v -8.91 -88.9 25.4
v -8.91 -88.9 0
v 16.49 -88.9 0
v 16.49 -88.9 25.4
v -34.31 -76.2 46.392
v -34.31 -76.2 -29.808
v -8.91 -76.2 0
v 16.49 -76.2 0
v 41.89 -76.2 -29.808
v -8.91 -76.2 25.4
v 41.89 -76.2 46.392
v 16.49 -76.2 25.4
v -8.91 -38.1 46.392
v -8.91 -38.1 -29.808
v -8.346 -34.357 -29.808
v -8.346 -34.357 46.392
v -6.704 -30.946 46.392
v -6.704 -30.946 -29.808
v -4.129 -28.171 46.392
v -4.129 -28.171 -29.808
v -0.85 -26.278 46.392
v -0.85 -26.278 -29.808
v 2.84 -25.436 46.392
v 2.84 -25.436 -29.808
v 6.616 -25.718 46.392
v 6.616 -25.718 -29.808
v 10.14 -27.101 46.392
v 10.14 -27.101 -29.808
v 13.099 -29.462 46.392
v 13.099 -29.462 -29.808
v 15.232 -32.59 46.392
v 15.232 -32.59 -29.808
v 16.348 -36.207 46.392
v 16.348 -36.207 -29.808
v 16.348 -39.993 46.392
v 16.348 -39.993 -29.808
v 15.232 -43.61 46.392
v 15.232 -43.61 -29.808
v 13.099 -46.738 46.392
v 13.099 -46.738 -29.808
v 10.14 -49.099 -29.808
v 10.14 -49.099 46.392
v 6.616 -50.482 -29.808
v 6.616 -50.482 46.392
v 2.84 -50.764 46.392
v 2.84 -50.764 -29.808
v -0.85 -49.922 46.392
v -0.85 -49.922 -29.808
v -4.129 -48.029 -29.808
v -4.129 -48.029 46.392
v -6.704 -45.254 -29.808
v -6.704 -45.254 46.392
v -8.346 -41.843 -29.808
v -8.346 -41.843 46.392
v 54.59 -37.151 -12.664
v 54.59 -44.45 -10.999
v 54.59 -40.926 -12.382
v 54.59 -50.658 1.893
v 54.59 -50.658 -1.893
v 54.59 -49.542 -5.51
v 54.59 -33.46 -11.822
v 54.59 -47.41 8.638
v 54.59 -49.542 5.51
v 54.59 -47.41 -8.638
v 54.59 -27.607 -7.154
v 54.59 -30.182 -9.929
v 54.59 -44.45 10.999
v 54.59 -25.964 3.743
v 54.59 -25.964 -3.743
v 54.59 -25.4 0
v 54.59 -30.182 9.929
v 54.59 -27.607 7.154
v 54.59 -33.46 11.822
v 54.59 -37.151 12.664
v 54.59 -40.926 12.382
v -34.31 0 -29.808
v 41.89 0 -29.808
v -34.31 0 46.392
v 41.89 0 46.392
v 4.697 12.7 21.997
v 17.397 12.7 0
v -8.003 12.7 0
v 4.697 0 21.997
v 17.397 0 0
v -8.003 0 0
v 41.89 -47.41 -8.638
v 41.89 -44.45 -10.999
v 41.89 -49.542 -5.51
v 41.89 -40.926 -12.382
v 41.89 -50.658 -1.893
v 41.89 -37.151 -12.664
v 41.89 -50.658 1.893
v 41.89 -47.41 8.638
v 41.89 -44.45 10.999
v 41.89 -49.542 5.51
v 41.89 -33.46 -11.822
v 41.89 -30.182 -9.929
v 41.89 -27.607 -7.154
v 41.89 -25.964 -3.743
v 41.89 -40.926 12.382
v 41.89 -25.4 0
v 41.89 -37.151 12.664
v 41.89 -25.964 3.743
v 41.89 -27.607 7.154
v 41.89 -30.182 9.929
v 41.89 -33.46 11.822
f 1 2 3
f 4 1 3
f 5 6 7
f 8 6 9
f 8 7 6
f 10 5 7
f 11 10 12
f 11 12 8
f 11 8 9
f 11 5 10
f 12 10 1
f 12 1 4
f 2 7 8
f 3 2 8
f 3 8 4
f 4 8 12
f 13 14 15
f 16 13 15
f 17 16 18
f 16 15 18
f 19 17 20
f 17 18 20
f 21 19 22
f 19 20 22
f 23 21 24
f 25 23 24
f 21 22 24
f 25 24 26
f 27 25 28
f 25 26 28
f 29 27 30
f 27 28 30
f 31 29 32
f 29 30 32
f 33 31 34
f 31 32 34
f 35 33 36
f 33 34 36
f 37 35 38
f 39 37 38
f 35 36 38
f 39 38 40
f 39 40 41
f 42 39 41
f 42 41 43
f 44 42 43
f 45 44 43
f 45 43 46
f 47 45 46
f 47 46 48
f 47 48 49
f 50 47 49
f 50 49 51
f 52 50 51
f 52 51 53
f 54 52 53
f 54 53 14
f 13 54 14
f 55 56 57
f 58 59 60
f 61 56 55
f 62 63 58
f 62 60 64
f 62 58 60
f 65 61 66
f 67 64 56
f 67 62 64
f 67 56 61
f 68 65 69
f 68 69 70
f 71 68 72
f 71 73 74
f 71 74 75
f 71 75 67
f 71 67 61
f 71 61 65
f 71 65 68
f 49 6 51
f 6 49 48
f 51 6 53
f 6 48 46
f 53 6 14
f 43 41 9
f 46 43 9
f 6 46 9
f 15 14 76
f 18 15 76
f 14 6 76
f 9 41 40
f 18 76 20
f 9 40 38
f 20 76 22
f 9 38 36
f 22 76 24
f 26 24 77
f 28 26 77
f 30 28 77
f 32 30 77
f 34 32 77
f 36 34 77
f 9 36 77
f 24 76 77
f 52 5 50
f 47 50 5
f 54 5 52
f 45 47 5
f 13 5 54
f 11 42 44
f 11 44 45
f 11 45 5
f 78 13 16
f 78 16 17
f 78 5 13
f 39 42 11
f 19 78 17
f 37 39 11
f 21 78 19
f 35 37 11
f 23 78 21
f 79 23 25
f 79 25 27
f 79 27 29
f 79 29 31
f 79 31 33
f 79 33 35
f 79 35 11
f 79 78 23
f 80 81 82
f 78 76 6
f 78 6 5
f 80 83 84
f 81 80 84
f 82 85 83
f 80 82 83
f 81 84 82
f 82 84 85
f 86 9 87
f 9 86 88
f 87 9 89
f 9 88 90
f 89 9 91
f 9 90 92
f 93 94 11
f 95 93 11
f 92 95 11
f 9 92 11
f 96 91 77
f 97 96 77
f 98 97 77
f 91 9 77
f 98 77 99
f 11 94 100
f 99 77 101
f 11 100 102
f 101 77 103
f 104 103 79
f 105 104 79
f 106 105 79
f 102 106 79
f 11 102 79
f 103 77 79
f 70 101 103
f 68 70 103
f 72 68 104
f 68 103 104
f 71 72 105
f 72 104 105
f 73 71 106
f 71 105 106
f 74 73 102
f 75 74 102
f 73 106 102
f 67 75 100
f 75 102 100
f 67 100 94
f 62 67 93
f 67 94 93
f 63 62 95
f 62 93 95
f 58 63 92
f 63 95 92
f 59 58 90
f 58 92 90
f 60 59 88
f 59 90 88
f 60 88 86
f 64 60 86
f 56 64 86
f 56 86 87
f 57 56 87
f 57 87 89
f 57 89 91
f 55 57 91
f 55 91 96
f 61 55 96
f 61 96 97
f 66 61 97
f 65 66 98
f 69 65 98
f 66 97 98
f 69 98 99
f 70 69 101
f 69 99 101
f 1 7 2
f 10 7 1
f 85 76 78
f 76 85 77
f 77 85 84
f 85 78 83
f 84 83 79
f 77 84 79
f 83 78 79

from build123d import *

# Parameters (mm, degrees)
F0_W      = 76.2
F0_H      = 76.2
F1_DEPTH  = 76.2
F3_D      = 25.4
F4_W      = 25.4
F4_H      = 25.4
F5_DEPTH  = 12.7
F6_R      = 12.7
F7_DEPTH  = 12.7
F5_FACE_W = 25.4
F5_FACE_H = 25.4
F9_DEPTH  = 12.7


with BuildPart() as f1:
    # F0 (on Front) → F1 (new body)
    with BuildSketch(Plane.XZ):
        with Locations((3.7895068526, 8.292155078)):
            Rectangle(F0_W, F0_H)
    extrude(amount=F1_DEPTH)

    # F3 (through all)
    with Locations(Plane.XY.offset(46.392155078)):
        with Locations((3.7895068526, -38.1)):
            Hole(F3_D / 2)

    # F4 (on face) → F5 (join)
    with BuildSketch(Plane.XZ.offset(76.2)):
        with Locations((3.7895068526, 12.7)):
            Rectangle(F4_W, F4_H)
    extrude(amount=F5_DEPTH)

    # F6 (on face) → F7 (join)
    with BuildSketch(Plane.YZ.offset(41.8895068526)):
        with Locations((-38.1, 0)):
            Circle(F6_R)
    extrude(amount=F7_DEPTH)

    # F8 (on face) + F5_face (on face) → F9 (join)
    with BuildSketch(Plane(origin=(0, 0, 0), x_dir=(-1, 0, 0), z_dir=(0, 1, 0))):
        Polygon((-17.3972853364, 0), (8.0027146636, 0), (-4.6972853364, 21.9970452561), align=None)
    with BuildSketch(Plane(origin=(3.7895068526, -88.9, 12.7), x_dir=(1, 0, 0), z_dir=(0, -1, 0))):
        Rectangle(F5_FACE_W, F5_FACE_H)
    extrude(amount=F9_DEPTH, dir=(0, 1, 0))


solid = f1.part
